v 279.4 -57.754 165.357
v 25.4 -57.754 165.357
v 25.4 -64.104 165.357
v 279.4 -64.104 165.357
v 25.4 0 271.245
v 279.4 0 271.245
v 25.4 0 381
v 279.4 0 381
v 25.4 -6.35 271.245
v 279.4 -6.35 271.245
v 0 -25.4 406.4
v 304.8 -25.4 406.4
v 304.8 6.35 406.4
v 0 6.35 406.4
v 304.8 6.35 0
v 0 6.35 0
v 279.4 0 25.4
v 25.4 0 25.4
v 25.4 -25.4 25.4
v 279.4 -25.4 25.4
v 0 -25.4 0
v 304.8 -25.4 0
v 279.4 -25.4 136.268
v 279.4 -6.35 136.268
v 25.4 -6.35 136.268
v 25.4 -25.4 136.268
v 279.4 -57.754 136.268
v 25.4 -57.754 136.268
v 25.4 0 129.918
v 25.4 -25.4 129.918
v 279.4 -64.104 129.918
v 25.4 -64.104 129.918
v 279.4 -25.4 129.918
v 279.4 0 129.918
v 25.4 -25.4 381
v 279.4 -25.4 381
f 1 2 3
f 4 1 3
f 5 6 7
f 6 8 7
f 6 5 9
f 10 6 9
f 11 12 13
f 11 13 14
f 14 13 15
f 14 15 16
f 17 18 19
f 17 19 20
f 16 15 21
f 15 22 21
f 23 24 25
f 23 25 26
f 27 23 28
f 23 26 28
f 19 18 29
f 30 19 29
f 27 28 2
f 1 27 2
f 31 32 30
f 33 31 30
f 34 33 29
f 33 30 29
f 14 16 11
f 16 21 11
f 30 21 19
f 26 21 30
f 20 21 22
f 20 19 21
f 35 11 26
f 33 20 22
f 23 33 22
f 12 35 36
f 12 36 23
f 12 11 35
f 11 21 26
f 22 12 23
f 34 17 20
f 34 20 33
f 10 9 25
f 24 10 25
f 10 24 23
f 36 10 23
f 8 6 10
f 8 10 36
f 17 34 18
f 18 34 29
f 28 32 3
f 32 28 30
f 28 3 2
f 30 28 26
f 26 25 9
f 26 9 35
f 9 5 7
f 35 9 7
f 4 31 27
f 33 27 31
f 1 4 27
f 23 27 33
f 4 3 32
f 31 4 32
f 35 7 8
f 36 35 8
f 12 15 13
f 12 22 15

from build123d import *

# Parameters (mm, degrees)
F0_W     = 304.8
F0_H     = 406.4
F0_W_2   = 254.0000006139
F0_H_2   = 355.6000006139
F1_DEPTH = 25.4
F2_W     = 304.8
F2_H     = 406.4
F3_DEPTH = 6.35
F5_DEPTH = 254.0000006139


with BuildPart() as f1:
    # F0 (on Front) → F1 (new body)
    with BuildSketch(Plane.XZ):
        with Locations((152.4, 203.2)):
            Rectangle(F0_W, F0_H)
        with Locations((152.4, 203.2)):
            Rectangle(F0_W_2, F0_H_2, mode=Mode.SUBTRACT)
    extrude(amount=F1_DEPTH)

    # F2 (on face) → F3 (join)
    with BuildSketch(Plane(origin=(0, 0, 0), x_dir=(-1, 0, 0), z_dir=(0, 1, 0))):
        with Locations((-152.4, 203.2)):
            Rectangle(F2_W, F2_H)
    extrude(amount=F3_DEPTH)

    # F4 (on face) → F5 (join, through all)
    with BuildSketch(Plane.YZ.offset(25.399999693)):
        Polygon((-64.1043111682, 129.9178004265), (-25.4, 129.9178004265), (-25.4, 136.2678004265), (-57.7543111682, 136.2678004265), (-57.7543111682, 165.3573513031), (-64.1043111682, 165.3573513031), align=None)
        Polygon((0, 129.9178004265), (0, 271.2446153164), (-6.35, 271.2446153164), (-6.35, 136.2678004265), (-25.4, 136.2678004265), (-25.4, 129.9178004265), align=None)
    extrude(amount=F5_DEPTH)


solid = f1.part
